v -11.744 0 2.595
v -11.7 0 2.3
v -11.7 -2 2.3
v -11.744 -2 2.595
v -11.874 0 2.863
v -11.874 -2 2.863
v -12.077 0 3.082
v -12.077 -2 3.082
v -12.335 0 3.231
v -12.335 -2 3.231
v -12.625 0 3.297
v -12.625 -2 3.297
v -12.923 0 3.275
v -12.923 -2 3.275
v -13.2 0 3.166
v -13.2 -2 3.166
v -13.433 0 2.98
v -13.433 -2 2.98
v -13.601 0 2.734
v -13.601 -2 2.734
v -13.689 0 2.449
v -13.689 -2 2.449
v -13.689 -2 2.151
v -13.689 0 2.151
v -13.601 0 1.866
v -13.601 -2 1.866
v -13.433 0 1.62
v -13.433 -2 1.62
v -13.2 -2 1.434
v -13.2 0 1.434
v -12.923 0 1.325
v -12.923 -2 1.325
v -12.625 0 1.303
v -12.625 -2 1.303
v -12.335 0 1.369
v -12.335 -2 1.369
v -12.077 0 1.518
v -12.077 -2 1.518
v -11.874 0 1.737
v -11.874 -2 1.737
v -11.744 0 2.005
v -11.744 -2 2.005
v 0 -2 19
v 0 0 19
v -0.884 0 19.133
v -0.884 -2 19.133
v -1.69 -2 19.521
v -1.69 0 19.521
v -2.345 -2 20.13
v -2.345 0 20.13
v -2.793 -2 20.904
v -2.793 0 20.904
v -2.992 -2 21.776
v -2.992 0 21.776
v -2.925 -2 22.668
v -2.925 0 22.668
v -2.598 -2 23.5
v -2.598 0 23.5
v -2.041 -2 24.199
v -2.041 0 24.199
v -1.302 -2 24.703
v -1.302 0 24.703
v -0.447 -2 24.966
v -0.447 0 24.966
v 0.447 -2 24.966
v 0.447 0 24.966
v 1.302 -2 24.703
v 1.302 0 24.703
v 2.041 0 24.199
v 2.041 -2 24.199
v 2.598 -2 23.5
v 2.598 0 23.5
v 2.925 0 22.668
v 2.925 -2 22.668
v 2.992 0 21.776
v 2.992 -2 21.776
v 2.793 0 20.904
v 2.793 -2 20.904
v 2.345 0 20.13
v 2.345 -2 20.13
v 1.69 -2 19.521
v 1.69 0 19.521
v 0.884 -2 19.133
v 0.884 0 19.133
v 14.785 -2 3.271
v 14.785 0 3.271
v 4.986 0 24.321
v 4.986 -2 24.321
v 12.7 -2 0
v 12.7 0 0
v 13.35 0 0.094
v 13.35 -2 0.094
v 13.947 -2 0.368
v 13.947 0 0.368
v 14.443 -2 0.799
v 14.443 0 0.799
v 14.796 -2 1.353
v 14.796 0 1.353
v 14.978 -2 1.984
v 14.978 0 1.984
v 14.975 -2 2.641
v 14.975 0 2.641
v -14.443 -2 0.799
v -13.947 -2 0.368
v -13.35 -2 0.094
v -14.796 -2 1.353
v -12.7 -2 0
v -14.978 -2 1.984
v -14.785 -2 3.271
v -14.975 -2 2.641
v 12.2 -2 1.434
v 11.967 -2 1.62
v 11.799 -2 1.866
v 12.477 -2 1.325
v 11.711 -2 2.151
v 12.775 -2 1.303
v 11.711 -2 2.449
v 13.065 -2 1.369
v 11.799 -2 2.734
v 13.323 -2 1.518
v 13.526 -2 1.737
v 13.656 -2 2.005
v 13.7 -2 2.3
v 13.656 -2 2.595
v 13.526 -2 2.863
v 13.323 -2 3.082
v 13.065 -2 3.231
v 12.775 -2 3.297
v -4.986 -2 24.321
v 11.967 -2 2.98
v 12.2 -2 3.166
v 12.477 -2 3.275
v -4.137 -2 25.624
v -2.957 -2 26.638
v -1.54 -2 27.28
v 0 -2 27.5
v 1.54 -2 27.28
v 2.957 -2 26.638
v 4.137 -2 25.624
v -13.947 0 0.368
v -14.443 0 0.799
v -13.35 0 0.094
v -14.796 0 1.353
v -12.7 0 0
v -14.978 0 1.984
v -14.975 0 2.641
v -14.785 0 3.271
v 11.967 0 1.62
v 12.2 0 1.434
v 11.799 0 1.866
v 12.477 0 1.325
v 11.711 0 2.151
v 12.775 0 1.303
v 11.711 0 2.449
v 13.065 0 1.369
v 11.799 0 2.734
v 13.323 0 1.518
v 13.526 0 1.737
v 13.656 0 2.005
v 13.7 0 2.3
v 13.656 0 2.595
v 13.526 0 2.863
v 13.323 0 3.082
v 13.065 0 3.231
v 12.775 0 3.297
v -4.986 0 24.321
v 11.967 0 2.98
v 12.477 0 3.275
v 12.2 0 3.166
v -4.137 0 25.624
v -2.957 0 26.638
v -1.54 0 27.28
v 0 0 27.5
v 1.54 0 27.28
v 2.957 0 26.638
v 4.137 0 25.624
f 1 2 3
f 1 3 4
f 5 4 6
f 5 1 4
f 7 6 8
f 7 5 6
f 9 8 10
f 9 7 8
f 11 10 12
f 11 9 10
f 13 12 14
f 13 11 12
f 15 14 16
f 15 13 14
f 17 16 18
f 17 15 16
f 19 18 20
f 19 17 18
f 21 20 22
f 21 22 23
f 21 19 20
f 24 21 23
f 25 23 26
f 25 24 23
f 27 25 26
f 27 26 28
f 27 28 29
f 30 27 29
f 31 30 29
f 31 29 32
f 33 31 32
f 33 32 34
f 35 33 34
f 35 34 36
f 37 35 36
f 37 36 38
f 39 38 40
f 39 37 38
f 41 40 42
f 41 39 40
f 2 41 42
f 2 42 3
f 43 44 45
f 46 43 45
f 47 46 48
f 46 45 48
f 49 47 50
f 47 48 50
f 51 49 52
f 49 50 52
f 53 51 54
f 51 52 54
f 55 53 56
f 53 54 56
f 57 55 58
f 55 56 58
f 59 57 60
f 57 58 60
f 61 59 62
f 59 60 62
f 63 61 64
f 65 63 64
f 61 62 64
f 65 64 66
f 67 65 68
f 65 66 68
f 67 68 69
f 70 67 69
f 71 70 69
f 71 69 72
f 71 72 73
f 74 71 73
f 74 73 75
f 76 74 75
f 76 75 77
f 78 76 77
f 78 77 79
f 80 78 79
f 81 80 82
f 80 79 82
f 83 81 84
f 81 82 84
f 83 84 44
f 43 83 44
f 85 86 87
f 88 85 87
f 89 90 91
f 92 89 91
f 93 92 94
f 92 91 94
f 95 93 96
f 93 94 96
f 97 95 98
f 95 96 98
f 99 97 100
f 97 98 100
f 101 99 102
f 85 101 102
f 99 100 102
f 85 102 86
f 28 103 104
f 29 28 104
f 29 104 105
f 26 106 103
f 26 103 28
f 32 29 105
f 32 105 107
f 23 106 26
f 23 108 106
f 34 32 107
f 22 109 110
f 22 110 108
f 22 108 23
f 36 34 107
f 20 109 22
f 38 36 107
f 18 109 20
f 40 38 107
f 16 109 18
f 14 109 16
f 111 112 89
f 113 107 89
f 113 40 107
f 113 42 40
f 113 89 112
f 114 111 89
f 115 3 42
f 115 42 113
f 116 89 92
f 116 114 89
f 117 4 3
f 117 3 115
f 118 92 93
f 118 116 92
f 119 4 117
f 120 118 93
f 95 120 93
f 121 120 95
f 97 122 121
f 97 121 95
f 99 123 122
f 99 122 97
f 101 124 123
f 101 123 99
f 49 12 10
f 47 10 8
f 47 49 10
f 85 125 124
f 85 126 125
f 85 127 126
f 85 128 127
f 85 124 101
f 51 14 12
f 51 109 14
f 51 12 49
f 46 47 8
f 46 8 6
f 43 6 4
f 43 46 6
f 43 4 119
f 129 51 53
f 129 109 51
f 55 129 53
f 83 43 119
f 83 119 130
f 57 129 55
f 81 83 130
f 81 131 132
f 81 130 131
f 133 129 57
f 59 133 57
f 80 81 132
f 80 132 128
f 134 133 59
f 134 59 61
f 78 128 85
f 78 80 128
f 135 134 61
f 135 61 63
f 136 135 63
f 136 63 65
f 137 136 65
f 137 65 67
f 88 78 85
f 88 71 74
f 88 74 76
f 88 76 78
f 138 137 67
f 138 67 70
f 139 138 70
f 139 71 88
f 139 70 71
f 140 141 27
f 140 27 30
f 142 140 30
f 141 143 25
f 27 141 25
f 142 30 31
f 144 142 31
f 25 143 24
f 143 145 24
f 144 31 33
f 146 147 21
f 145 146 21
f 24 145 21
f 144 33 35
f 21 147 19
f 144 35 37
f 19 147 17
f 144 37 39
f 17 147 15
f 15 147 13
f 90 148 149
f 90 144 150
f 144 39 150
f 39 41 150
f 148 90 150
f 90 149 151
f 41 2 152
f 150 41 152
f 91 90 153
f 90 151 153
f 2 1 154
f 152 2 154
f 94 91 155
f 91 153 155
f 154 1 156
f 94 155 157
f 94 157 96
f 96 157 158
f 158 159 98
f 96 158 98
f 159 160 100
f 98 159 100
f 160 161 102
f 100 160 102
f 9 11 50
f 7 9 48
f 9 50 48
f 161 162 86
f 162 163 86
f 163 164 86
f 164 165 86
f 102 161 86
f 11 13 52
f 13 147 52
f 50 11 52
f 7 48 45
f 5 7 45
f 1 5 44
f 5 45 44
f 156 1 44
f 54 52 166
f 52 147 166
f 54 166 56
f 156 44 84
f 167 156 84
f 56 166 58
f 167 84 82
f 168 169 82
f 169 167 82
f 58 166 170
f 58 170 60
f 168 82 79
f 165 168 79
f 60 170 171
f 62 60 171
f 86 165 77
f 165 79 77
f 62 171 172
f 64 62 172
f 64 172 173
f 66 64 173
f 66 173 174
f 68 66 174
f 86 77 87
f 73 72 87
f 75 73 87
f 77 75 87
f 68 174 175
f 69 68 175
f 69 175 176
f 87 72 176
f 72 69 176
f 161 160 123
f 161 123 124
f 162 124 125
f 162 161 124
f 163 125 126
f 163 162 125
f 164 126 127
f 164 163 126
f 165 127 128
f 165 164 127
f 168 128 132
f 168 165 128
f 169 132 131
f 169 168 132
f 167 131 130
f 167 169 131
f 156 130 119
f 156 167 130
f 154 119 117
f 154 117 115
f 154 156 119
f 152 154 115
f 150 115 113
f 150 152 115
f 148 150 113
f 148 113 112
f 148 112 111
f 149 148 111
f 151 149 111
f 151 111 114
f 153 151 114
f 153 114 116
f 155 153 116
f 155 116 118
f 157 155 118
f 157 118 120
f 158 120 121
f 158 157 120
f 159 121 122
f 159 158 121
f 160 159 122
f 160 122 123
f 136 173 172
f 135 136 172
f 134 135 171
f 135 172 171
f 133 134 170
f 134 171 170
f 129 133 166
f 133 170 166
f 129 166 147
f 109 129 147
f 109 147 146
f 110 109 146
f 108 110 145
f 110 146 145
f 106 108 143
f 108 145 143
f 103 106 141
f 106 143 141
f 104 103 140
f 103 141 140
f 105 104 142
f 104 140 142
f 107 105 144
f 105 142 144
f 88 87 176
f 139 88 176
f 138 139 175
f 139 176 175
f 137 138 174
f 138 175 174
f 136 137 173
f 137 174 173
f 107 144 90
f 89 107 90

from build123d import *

# Parameters (mm, degrees)
F0_R     = 1
F1_DEPTH = 2


with BuildPart() as f1:
    # F0 (on Front) → F1 (new body)
    with BuildSketch(Plane.XZ):
        with BuildLine():
            Line((14.785155, 3.270633), (4.98624, 24.321079))
            ThreePointArc((4.98624, 24.321079), (2.956693, 26.637668), (0, 27.5))
            ThreePointArc((0, 27.5), (-2.956693, 26.637668), (-4.98624, 24.321079))
            Line((-4.98624, 24.321079), (-14.785155, 3.270633))
            ThreePointArc((-14.785155, 3.270633), (-14.639389, 1.063565), (-12.7, 0))
            Line((-12.7, 0), (0, 0))
            Line((0, 0), (12.7, 0))
            ThreePointArc((12.7, 0), (14.639389, 1.063565), (14.785155, 3.270633))
        make_face()
        with Locations((-12.7, 2.3)):
            Circle(F0_R, mode=Mode.SUBTRACT)
        with Locations((12.7, 2.3)):
            Circle(F0_R, mode=Mode.SUBTRACT)
        with BuildLine():
            ThreePointArc((0, 25), (3, 22), (0, 19))
            ThreePointArc((0, 19), (-3, 22), (0, 25))
        make_face(mode=Mode.SUBTRACT)
    extrude(amount=F1_DEPTH)


solid = f1.part
